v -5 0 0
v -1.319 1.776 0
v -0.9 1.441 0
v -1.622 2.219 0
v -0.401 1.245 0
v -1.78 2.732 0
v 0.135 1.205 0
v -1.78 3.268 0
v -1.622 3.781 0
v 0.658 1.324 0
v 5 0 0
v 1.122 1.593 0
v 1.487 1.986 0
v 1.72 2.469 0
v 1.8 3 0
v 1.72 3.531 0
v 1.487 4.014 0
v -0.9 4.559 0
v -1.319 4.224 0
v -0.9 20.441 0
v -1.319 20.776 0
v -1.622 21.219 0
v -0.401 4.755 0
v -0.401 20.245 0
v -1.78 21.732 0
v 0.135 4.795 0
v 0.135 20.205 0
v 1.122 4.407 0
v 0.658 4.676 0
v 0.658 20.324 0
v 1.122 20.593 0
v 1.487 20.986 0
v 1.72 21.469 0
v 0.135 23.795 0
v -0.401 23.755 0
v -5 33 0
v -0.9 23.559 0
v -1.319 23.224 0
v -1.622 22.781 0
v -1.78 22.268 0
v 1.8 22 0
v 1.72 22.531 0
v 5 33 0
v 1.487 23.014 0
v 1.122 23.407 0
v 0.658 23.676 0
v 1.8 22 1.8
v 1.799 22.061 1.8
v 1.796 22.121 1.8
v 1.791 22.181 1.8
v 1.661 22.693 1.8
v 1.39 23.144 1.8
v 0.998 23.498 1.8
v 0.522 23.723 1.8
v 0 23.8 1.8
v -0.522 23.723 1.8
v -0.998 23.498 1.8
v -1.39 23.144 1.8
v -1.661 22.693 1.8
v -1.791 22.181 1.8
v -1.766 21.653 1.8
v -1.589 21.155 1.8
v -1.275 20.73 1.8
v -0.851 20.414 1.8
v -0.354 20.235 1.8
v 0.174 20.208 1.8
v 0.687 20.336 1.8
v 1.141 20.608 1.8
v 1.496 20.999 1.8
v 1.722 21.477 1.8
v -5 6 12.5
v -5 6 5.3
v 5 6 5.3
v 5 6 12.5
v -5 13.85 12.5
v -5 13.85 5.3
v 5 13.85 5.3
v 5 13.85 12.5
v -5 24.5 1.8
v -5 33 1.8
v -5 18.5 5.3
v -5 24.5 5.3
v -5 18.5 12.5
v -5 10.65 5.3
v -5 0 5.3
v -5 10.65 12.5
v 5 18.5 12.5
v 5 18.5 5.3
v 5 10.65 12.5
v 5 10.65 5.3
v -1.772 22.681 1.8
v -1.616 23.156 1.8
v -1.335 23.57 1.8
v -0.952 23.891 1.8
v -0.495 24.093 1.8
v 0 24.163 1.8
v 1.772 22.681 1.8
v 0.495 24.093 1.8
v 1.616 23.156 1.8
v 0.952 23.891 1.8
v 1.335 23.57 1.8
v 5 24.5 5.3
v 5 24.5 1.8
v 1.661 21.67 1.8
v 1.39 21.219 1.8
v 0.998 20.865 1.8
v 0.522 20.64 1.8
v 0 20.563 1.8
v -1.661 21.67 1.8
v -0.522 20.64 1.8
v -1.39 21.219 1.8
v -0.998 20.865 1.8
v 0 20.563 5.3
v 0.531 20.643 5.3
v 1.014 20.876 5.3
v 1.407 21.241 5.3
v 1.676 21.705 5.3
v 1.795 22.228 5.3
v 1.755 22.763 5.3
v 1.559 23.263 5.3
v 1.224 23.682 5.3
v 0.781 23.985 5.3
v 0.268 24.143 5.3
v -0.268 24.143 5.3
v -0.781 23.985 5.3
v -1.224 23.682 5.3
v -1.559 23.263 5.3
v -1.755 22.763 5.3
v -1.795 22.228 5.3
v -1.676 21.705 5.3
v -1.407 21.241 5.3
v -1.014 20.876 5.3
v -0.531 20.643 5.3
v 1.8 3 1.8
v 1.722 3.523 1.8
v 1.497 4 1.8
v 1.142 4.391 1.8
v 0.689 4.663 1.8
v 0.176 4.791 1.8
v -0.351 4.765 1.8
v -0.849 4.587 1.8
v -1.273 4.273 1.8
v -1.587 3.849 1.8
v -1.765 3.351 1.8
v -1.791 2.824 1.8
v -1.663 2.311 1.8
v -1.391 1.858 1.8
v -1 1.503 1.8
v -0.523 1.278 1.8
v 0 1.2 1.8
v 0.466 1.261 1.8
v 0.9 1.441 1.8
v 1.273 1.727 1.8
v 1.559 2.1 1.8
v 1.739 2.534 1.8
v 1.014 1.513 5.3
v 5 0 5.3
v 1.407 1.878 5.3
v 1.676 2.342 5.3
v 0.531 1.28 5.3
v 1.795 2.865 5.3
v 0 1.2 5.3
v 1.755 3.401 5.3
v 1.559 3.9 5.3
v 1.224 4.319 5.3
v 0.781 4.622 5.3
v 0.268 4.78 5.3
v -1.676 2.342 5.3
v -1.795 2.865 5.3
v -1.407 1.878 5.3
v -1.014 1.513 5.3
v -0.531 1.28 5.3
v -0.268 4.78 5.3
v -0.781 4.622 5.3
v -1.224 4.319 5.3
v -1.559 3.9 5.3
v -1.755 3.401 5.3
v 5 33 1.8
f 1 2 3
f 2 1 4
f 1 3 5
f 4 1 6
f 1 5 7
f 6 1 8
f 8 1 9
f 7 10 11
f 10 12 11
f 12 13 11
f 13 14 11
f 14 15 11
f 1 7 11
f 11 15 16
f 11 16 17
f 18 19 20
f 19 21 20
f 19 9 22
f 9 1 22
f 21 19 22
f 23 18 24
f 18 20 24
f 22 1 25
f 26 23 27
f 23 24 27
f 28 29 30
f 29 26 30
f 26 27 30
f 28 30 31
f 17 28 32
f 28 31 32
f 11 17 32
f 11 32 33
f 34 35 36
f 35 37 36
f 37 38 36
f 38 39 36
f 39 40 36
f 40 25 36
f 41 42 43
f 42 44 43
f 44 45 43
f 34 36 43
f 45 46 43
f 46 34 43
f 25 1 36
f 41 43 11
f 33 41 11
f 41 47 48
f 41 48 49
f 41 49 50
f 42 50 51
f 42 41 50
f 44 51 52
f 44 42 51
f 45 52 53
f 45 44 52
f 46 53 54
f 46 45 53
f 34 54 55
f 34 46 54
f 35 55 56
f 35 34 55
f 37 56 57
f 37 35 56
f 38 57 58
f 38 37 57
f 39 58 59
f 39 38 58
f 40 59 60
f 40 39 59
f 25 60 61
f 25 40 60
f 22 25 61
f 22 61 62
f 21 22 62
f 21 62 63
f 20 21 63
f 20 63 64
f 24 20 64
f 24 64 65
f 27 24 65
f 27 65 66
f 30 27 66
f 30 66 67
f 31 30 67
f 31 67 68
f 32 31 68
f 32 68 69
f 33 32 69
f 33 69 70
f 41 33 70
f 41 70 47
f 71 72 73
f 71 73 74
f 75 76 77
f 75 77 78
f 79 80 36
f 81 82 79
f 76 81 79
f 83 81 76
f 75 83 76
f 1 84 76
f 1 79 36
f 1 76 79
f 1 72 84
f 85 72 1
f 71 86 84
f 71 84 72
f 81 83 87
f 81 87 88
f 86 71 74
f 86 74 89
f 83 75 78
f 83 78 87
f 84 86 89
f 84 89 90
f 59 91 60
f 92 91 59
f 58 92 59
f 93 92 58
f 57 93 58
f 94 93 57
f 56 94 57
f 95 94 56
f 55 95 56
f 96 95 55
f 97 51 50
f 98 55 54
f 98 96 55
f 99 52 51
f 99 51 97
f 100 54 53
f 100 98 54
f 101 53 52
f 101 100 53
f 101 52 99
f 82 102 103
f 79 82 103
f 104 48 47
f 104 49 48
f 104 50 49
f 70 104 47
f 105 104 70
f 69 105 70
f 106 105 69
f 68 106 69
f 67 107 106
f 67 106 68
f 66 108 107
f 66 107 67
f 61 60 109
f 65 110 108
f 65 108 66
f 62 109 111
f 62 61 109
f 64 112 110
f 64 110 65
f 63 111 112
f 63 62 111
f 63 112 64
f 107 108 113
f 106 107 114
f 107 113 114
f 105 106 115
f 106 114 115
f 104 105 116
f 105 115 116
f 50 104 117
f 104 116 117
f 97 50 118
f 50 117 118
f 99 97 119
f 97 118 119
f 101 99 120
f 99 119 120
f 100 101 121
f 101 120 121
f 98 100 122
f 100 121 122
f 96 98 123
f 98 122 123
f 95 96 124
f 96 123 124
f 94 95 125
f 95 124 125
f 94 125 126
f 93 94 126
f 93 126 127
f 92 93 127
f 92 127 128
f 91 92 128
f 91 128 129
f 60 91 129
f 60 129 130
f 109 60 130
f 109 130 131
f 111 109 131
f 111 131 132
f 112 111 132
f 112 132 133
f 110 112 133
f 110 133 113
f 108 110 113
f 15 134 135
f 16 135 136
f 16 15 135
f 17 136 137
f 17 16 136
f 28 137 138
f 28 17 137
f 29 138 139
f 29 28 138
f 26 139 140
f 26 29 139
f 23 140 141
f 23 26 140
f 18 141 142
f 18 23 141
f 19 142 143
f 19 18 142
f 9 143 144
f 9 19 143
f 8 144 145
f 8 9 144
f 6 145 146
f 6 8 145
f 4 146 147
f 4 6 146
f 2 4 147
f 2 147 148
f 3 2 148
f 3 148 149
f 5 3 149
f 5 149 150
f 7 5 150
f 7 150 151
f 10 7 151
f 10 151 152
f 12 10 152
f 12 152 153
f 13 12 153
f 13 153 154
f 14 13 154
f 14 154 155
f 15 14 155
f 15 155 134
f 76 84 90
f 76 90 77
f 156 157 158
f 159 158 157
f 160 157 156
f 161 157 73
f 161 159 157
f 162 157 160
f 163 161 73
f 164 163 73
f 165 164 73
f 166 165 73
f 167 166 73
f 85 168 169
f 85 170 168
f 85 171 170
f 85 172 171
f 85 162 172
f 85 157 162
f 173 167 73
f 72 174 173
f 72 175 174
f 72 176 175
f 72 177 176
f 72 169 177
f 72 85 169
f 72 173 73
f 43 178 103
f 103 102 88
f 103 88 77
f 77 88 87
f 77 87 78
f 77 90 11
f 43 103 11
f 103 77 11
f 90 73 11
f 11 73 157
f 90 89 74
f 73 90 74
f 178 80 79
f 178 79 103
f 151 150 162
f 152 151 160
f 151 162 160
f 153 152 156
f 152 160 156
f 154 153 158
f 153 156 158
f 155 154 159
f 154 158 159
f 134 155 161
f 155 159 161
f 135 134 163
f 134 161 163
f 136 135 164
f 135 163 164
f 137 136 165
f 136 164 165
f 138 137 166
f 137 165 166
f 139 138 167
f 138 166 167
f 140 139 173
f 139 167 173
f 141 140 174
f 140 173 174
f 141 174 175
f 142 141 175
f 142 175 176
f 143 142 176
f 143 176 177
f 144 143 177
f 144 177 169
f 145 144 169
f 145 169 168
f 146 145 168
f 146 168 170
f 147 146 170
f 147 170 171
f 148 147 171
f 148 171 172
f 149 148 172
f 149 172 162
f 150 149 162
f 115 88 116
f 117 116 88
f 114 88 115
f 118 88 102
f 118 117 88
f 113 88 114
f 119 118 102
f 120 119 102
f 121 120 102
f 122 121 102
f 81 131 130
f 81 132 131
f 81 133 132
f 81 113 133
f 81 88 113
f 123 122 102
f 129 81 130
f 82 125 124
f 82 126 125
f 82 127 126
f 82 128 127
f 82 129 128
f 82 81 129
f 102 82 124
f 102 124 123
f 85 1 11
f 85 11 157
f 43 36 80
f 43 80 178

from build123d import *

# Parameters (mm, degrees)
PAD001_DEPTH = 10
SKETCH002_R  = 1.8
POCKET_DEPTH = 3.501
SKETCH_W     = 10
SKETCH_H     = 33
SKETCH_R     = 1.8
PAD_DEPTH    = 1.8


with BuildPart() as body001:
    # Sketch001 → Pad001 (new body)
    with BuildSketch(Plane.YZ.offset(-5)):
        Polygon((0, 1.8), (0, 5.3), (6, 5.3), (6, 12.5), (10.65, 12.5), (10.65, 5.3), (13.85, 5.3), (13.85, 12.5), (18.5, 12.5), (18.5, 5.3), (24.5, 5.3), (24.5, 1.8), align=None)
    extrude(amount=PAD001_DEPTH)

    # Sketch002 (on Face2 of Pad001) → Pocket (cut, through all)
    with BuildSketch(Plane(origin=(0, 0, 5.3), x_dir=(0, -1, 0), z_dir=(0, 0, 1))):
        with Locations((-22.36288, 0)):
            Circle(SKETCH002_R)
        with Locations((-3, 0)):
            Circle(SKETCH002_R)
    extrude(amount=-POCKET_DEPTH, mode=Mode.SUBTRACT)


with BuildPart() as fusion:
    # Sketch → Pad (new body)
    with BuildSketch(Plane.XY):
        with Locations((0, 16.5)):
            Rectangle(SKETCH_W, SKETCH_H)
        with Locations((0, 22)):
            Circle(SKETCH_R, mode=Mode.SUBTRACT)
        with Locations((0, 3)):
            Circle(SKETCH_R, mode=Mode.SUBTRACT)
    extrude(amount=PAD_DEPTH)

    # Fusion: union Body001
    add(body001.part)


solid = fusion.part
